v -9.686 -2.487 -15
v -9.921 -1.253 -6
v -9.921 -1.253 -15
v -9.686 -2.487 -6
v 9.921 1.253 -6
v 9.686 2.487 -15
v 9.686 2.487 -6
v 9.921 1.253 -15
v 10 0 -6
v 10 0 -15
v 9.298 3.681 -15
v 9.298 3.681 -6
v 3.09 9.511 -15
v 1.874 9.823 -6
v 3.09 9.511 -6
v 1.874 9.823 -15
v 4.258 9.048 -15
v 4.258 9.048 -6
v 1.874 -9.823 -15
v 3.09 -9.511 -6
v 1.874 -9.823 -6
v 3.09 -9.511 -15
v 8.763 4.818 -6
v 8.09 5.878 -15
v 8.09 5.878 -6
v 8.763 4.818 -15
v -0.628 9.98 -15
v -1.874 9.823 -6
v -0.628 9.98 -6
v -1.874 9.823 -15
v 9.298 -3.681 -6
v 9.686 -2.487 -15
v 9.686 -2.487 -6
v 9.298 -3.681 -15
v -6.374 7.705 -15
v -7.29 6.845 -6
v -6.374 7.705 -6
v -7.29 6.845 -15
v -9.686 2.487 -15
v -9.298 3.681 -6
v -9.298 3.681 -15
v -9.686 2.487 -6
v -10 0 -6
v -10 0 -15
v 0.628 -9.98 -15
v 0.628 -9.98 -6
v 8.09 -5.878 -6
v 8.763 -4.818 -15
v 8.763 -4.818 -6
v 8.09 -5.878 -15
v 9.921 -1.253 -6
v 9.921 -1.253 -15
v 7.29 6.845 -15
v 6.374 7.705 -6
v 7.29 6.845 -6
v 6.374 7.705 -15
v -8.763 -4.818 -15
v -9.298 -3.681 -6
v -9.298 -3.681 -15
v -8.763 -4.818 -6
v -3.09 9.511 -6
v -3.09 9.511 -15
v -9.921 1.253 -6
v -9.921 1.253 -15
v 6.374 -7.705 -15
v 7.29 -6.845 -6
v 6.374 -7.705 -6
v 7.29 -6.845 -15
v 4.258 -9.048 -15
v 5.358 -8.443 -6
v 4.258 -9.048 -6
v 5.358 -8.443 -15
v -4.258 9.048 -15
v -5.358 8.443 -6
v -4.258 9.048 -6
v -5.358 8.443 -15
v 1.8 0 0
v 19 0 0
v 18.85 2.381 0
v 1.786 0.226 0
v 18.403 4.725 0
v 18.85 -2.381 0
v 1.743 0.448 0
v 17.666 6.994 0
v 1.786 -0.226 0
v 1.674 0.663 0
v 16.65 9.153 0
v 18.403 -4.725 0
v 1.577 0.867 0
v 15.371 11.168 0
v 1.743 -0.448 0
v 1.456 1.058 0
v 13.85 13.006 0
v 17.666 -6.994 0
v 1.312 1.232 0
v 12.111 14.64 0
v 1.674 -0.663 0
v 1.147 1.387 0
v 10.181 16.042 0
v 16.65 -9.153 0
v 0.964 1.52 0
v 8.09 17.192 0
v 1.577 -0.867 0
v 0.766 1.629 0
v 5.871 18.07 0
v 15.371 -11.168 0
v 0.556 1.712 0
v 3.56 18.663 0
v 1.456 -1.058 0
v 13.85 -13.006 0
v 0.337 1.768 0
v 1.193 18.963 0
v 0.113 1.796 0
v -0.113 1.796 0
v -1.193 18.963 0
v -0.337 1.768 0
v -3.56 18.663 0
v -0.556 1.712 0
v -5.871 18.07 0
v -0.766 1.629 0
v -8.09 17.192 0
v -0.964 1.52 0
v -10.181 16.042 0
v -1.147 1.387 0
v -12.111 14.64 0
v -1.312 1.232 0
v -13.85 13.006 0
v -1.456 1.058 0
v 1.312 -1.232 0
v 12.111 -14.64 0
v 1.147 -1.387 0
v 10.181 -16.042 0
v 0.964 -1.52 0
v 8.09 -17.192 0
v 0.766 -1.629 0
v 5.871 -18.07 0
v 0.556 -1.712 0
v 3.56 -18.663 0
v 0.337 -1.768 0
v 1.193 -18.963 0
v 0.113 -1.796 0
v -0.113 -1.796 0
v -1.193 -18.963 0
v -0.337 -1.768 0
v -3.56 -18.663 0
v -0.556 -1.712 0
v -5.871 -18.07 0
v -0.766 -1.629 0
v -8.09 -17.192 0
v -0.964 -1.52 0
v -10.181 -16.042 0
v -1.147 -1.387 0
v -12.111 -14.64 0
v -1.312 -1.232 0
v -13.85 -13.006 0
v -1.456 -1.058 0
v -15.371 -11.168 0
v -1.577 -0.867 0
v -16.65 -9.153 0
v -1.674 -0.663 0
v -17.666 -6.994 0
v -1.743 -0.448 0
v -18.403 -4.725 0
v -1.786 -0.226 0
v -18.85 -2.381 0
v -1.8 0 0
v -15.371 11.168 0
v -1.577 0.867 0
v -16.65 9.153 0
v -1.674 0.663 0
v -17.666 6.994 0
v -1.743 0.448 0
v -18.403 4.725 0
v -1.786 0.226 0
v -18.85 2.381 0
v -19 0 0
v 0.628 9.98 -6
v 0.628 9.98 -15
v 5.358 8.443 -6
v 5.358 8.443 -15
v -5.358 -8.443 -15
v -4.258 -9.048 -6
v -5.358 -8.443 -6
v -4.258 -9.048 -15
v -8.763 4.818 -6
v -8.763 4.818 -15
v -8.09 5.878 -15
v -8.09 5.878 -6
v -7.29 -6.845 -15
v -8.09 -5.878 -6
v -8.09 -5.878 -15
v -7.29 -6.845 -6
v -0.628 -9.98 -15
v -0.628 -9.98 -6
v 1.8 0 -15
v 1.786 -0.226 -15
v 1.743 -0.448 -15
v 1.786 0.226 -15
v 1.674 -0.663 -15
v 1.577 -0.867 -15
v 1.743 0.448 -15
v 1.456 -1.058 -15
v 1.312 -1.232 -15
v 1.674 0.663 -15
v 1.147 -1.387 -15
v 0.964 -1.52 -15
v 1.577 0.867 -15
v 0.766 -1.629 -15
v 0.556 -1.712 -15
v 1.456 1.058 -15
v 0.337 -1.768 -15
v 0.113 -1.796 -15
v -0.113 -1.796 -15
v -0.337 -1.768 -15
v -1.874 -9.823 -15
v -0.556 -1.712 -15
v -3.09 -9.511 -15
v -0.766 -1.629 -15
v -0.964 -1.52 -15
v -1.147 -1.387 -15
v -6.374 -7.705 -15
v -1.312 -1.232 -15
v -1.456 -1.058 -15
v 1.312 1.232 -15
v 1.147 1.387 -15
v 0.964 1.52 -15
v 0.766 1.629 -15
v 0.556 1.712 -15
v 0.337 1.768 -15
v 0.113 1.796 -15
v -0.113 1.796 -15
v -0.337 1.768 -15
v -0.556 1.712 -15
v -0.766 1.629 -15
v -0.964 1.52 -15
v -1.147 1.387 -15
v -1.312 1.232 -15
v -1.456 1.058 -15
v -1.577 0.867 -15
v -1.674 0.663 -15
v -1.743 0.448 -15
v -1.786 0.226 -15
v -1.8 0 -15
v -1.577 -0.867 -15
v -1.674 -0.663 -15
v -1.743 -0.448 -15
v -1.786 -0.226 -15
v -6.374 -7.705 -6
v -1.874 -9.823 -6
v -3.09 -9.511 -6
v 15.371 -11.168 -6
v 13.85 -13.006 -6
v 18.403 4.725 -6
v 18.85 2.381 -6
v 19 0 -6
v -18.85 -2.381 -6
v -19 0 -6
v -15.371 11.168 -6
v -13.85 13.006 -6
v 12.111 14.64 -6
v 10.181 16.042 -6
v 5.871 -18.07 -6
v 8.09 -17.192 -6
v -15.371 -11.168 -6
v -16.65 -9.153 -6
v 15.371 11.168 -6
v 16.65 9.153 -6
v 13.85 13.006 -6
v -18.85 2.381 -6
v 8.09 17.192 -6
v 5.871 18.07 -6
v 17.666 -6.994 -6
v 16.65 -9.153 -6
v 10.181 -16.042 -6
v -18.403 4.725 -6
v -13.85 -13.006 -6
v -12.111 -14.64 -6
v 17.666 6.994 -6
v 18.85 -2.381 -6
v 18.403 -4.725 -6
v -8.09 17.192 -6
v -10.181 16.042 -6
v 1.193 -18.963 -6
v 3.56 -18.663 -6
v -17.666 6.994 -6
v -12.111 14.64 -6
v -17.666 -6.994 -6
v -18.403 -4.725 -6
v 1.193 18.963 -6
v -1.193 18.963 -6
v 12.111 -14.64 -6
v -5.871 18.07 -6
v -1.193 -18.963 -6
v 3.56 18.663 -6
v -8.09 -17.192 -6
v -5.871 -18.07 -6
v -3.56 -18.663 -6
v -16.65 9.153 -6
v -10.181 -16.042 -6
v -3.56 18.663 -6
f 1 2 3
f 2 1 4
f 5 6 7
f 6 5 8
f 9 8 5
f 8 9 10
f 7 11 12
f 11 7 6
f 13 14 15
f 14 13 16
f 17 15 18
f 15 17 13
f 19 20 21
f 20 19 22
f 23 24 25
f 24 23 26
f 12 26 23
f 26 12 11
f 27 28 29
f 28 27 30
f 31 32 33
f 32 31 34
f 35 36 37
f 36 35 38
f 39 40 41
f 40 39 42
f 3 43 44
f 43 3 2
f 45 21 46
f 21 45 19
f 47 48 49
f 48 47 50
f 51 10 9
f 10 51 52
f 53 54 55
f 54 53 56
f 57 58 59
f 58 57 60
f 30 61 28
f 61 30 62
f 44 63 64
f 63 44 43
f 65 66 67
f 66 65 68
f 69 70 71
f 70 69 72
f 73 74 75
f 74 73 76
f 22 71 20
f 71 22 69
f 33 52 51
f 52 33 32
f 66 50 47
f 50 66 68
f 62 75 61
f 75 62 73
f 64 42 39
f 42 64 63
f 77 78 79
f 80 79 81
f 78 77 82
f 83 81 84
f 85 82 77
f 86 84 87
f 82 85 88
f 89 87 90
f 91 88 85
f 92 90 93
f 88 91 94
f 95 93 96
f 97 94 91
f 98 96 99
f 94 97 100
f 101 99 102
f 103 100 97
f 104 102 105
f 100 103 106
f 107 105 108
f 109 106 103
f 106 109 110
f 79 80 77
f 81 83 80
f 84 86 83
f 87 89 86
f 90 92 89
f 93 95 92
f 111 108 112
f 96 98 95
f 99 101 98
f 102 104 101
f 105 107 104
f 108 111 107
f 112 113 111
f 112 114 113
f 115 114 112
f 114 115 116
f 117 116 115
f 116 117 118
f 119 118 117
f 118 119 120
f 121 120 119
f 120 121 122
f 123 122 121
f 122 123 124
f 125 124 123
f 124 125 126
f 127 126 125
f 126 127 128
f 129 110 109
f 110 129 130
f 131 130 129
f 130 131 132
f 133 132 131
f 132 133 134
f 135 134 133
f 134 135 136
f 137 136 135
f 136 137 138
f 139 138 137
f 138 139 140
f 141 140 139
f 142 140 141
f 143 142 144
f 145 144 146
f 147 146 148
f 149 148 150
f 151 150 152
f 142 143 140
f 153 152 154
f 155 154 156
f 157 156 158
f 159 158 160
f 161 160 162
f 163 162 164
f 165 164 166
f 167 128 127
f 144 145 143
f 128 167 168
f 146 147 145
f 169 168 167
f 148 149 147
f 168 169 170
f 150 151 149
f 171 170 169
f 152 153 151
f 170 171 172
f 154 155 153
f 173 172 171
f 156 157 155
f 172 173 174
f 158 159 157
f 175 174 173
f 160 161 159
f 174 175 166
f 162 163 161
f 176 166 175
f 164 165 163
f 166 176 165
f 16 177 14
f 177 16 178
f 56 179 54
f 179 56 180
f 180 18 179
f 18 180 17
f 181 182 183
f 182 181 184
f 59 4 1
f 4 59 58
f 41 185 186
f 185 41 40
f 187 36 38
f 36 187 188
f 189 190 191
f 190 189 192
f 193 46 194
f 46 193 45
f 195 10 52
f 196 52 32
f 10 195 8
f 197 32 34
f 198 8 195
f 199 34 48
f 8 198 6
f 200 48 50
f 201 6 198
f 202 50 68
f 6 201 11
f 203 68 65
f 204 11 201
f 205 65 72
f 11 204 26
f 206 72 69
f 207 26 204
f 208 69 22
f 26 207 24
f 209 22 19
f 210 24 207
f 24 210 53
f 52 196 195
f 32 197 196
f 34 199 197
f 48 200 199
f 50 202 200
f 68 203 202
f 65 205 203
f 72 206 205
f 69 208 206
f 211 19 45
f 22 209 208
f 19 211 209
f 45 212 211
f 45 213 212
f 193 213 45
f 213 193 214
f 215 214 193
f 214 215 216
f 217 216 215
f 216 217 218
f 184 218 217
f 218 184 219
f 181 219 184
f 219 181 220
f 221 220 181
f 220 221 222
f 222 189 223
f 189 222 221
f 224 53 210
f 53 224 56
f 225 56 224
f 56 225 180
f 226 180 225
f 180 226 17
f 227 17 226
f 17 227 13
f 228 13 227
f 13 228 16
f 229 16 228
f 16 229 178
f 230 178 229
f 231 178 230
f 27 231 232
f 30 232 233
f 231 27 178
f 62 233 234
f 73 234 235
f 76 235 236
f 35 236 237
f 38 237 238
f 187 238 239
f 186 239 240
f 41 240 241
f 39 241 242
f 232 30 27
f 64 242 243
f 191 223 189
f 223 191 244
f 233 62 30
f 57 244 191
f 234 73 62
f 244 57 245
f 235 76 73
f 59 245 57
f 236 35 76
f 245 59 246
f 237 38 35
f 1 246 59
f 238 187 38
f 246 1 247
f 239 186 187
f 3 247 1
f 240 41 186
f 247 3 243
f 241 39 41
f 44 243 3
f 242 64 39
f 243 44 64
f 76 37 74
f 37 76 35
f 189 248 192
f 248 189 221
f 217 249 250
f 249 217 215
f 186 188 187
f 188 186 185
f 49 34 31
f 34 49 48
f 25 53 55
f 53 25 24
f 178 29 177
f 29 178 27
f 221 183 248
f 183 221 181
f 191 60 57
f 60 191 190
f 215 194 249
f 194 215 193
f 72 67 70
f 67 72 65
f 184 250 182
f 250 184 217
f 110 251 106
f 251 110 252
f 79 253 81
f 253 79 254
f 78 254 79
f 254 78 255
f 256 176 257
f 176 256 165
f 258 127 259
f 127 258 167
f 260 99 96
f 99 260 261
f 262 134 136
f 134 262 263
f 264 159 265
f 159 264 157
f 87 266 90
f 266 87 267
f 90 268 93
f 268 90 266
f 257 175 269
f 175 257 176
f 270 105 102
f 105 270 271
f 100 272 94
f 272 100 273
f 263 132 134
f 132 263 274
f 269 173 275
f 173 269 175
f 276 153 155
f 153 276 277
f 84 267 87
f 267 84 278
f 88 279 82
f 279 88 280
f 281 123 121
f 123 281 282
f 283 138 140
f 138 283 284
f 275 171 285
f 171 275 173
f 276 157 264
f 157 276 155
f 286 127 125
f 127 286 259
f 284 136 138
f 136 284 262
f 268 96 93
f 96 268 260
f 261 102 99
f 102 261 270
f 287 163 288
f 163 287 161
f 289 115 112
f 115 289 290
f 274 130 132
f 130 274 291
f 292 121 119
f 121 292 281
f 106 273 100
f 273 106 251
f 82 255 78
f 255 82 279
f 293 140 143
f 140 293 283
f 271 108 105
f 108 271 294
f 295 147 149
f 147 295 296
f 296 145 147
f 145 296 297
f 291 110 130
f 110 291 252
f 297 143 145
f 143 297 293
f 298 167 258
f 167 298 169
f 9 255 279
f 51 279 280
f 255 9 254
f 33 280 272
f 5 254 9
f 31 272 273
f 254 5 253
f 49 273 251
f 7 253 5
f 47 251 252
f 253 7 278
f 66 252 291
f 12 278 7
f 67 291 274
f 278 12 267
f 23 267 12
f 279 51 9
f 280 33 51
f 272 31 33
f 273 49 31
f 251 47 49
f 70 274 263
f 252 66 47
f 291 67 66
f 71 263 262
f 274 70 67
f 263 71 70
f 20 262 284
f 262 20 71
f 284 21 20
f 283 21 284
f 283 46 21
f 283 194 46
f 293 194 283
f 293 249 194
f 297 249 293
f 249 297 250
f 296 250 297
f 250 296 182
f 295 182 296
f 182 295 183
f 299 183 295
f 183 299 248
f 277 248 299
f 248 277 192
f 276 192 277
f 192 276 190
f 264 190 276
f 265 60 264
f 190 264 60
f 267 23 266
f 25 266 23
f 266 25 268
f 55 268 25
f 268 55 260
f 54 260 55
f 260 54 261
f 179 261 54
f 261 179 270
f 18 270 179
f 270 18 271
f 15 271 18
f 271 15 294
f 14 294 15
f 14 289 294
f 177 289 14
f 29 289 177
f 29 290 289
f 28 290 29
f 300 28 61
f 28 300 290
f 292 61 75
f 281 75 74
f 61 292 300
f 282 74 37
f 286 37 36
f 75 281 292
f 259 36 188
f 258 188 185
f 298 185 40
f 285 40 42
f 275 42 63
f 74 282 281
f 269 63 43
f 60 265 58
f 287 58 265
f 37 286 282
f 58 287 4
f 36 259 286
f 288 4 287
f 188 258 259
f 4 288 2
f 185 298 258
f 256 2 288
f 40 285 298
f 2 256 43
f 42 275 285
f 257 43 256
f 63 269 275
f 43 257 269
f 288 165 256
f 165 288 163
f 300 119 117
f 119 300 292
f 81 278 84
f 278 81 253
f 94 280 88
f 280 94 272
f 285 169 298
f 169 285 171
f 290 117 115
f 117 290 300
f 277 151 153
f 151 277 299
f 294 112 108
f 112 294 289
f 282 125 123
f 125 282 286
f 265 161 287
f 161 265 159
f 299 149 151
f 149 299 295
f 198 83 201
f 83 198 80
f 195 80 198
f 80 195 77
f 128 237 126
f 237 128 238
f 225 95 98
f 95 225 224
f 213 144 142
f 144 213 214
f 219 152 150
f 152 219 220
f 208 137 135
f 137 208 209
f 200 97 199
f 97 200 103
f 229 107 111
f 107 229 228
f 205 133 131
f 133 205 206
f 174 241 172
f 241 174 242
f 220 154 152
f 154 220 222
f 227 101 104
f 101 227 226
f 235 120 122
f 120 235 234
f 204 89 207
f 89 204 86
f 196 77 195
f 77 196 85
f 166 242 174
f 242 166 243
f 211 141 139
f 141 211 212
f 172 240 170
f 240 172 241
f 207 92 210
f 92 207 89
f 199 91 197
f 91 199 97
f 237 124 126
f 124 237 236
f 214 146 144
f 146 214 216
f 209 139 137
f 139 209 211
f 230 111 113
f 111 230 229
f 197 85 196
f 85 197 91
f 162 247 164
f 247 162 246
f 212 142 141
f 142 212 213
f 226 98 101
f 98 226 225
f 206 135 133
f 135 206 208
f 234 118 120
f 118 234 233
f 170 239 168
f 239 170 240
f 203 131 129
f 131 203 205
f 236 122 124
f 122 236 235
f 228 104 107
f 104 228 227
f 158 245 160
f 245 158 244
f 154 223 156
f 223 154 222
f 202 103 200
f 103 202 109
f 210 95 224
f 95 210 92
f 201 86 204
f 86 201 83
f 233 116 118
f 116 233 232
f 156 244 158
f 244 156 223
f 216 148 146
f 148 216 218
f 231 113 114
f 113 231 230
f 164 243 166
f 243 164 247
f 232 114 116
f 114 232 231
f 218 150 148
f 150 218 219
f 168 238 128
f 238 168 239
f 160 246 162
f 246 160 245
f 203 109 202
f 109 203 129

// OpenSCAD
$fn = 50;


difference() {
	union() {
		translate(v = [0, 0, -15.0000000000]) {
			cylinder(h = 15, r = 10.0000000000);
		}
		translate(v = [0, 0, -6.0000000000]) {
			cylinder(h = 6, r = 19.0000000000);
		}
	}
	union() {
		#translate(v = [0, 0, -15]) {
			cylinder(h = 15, r = 1.8000000000);
		}
	}
}
